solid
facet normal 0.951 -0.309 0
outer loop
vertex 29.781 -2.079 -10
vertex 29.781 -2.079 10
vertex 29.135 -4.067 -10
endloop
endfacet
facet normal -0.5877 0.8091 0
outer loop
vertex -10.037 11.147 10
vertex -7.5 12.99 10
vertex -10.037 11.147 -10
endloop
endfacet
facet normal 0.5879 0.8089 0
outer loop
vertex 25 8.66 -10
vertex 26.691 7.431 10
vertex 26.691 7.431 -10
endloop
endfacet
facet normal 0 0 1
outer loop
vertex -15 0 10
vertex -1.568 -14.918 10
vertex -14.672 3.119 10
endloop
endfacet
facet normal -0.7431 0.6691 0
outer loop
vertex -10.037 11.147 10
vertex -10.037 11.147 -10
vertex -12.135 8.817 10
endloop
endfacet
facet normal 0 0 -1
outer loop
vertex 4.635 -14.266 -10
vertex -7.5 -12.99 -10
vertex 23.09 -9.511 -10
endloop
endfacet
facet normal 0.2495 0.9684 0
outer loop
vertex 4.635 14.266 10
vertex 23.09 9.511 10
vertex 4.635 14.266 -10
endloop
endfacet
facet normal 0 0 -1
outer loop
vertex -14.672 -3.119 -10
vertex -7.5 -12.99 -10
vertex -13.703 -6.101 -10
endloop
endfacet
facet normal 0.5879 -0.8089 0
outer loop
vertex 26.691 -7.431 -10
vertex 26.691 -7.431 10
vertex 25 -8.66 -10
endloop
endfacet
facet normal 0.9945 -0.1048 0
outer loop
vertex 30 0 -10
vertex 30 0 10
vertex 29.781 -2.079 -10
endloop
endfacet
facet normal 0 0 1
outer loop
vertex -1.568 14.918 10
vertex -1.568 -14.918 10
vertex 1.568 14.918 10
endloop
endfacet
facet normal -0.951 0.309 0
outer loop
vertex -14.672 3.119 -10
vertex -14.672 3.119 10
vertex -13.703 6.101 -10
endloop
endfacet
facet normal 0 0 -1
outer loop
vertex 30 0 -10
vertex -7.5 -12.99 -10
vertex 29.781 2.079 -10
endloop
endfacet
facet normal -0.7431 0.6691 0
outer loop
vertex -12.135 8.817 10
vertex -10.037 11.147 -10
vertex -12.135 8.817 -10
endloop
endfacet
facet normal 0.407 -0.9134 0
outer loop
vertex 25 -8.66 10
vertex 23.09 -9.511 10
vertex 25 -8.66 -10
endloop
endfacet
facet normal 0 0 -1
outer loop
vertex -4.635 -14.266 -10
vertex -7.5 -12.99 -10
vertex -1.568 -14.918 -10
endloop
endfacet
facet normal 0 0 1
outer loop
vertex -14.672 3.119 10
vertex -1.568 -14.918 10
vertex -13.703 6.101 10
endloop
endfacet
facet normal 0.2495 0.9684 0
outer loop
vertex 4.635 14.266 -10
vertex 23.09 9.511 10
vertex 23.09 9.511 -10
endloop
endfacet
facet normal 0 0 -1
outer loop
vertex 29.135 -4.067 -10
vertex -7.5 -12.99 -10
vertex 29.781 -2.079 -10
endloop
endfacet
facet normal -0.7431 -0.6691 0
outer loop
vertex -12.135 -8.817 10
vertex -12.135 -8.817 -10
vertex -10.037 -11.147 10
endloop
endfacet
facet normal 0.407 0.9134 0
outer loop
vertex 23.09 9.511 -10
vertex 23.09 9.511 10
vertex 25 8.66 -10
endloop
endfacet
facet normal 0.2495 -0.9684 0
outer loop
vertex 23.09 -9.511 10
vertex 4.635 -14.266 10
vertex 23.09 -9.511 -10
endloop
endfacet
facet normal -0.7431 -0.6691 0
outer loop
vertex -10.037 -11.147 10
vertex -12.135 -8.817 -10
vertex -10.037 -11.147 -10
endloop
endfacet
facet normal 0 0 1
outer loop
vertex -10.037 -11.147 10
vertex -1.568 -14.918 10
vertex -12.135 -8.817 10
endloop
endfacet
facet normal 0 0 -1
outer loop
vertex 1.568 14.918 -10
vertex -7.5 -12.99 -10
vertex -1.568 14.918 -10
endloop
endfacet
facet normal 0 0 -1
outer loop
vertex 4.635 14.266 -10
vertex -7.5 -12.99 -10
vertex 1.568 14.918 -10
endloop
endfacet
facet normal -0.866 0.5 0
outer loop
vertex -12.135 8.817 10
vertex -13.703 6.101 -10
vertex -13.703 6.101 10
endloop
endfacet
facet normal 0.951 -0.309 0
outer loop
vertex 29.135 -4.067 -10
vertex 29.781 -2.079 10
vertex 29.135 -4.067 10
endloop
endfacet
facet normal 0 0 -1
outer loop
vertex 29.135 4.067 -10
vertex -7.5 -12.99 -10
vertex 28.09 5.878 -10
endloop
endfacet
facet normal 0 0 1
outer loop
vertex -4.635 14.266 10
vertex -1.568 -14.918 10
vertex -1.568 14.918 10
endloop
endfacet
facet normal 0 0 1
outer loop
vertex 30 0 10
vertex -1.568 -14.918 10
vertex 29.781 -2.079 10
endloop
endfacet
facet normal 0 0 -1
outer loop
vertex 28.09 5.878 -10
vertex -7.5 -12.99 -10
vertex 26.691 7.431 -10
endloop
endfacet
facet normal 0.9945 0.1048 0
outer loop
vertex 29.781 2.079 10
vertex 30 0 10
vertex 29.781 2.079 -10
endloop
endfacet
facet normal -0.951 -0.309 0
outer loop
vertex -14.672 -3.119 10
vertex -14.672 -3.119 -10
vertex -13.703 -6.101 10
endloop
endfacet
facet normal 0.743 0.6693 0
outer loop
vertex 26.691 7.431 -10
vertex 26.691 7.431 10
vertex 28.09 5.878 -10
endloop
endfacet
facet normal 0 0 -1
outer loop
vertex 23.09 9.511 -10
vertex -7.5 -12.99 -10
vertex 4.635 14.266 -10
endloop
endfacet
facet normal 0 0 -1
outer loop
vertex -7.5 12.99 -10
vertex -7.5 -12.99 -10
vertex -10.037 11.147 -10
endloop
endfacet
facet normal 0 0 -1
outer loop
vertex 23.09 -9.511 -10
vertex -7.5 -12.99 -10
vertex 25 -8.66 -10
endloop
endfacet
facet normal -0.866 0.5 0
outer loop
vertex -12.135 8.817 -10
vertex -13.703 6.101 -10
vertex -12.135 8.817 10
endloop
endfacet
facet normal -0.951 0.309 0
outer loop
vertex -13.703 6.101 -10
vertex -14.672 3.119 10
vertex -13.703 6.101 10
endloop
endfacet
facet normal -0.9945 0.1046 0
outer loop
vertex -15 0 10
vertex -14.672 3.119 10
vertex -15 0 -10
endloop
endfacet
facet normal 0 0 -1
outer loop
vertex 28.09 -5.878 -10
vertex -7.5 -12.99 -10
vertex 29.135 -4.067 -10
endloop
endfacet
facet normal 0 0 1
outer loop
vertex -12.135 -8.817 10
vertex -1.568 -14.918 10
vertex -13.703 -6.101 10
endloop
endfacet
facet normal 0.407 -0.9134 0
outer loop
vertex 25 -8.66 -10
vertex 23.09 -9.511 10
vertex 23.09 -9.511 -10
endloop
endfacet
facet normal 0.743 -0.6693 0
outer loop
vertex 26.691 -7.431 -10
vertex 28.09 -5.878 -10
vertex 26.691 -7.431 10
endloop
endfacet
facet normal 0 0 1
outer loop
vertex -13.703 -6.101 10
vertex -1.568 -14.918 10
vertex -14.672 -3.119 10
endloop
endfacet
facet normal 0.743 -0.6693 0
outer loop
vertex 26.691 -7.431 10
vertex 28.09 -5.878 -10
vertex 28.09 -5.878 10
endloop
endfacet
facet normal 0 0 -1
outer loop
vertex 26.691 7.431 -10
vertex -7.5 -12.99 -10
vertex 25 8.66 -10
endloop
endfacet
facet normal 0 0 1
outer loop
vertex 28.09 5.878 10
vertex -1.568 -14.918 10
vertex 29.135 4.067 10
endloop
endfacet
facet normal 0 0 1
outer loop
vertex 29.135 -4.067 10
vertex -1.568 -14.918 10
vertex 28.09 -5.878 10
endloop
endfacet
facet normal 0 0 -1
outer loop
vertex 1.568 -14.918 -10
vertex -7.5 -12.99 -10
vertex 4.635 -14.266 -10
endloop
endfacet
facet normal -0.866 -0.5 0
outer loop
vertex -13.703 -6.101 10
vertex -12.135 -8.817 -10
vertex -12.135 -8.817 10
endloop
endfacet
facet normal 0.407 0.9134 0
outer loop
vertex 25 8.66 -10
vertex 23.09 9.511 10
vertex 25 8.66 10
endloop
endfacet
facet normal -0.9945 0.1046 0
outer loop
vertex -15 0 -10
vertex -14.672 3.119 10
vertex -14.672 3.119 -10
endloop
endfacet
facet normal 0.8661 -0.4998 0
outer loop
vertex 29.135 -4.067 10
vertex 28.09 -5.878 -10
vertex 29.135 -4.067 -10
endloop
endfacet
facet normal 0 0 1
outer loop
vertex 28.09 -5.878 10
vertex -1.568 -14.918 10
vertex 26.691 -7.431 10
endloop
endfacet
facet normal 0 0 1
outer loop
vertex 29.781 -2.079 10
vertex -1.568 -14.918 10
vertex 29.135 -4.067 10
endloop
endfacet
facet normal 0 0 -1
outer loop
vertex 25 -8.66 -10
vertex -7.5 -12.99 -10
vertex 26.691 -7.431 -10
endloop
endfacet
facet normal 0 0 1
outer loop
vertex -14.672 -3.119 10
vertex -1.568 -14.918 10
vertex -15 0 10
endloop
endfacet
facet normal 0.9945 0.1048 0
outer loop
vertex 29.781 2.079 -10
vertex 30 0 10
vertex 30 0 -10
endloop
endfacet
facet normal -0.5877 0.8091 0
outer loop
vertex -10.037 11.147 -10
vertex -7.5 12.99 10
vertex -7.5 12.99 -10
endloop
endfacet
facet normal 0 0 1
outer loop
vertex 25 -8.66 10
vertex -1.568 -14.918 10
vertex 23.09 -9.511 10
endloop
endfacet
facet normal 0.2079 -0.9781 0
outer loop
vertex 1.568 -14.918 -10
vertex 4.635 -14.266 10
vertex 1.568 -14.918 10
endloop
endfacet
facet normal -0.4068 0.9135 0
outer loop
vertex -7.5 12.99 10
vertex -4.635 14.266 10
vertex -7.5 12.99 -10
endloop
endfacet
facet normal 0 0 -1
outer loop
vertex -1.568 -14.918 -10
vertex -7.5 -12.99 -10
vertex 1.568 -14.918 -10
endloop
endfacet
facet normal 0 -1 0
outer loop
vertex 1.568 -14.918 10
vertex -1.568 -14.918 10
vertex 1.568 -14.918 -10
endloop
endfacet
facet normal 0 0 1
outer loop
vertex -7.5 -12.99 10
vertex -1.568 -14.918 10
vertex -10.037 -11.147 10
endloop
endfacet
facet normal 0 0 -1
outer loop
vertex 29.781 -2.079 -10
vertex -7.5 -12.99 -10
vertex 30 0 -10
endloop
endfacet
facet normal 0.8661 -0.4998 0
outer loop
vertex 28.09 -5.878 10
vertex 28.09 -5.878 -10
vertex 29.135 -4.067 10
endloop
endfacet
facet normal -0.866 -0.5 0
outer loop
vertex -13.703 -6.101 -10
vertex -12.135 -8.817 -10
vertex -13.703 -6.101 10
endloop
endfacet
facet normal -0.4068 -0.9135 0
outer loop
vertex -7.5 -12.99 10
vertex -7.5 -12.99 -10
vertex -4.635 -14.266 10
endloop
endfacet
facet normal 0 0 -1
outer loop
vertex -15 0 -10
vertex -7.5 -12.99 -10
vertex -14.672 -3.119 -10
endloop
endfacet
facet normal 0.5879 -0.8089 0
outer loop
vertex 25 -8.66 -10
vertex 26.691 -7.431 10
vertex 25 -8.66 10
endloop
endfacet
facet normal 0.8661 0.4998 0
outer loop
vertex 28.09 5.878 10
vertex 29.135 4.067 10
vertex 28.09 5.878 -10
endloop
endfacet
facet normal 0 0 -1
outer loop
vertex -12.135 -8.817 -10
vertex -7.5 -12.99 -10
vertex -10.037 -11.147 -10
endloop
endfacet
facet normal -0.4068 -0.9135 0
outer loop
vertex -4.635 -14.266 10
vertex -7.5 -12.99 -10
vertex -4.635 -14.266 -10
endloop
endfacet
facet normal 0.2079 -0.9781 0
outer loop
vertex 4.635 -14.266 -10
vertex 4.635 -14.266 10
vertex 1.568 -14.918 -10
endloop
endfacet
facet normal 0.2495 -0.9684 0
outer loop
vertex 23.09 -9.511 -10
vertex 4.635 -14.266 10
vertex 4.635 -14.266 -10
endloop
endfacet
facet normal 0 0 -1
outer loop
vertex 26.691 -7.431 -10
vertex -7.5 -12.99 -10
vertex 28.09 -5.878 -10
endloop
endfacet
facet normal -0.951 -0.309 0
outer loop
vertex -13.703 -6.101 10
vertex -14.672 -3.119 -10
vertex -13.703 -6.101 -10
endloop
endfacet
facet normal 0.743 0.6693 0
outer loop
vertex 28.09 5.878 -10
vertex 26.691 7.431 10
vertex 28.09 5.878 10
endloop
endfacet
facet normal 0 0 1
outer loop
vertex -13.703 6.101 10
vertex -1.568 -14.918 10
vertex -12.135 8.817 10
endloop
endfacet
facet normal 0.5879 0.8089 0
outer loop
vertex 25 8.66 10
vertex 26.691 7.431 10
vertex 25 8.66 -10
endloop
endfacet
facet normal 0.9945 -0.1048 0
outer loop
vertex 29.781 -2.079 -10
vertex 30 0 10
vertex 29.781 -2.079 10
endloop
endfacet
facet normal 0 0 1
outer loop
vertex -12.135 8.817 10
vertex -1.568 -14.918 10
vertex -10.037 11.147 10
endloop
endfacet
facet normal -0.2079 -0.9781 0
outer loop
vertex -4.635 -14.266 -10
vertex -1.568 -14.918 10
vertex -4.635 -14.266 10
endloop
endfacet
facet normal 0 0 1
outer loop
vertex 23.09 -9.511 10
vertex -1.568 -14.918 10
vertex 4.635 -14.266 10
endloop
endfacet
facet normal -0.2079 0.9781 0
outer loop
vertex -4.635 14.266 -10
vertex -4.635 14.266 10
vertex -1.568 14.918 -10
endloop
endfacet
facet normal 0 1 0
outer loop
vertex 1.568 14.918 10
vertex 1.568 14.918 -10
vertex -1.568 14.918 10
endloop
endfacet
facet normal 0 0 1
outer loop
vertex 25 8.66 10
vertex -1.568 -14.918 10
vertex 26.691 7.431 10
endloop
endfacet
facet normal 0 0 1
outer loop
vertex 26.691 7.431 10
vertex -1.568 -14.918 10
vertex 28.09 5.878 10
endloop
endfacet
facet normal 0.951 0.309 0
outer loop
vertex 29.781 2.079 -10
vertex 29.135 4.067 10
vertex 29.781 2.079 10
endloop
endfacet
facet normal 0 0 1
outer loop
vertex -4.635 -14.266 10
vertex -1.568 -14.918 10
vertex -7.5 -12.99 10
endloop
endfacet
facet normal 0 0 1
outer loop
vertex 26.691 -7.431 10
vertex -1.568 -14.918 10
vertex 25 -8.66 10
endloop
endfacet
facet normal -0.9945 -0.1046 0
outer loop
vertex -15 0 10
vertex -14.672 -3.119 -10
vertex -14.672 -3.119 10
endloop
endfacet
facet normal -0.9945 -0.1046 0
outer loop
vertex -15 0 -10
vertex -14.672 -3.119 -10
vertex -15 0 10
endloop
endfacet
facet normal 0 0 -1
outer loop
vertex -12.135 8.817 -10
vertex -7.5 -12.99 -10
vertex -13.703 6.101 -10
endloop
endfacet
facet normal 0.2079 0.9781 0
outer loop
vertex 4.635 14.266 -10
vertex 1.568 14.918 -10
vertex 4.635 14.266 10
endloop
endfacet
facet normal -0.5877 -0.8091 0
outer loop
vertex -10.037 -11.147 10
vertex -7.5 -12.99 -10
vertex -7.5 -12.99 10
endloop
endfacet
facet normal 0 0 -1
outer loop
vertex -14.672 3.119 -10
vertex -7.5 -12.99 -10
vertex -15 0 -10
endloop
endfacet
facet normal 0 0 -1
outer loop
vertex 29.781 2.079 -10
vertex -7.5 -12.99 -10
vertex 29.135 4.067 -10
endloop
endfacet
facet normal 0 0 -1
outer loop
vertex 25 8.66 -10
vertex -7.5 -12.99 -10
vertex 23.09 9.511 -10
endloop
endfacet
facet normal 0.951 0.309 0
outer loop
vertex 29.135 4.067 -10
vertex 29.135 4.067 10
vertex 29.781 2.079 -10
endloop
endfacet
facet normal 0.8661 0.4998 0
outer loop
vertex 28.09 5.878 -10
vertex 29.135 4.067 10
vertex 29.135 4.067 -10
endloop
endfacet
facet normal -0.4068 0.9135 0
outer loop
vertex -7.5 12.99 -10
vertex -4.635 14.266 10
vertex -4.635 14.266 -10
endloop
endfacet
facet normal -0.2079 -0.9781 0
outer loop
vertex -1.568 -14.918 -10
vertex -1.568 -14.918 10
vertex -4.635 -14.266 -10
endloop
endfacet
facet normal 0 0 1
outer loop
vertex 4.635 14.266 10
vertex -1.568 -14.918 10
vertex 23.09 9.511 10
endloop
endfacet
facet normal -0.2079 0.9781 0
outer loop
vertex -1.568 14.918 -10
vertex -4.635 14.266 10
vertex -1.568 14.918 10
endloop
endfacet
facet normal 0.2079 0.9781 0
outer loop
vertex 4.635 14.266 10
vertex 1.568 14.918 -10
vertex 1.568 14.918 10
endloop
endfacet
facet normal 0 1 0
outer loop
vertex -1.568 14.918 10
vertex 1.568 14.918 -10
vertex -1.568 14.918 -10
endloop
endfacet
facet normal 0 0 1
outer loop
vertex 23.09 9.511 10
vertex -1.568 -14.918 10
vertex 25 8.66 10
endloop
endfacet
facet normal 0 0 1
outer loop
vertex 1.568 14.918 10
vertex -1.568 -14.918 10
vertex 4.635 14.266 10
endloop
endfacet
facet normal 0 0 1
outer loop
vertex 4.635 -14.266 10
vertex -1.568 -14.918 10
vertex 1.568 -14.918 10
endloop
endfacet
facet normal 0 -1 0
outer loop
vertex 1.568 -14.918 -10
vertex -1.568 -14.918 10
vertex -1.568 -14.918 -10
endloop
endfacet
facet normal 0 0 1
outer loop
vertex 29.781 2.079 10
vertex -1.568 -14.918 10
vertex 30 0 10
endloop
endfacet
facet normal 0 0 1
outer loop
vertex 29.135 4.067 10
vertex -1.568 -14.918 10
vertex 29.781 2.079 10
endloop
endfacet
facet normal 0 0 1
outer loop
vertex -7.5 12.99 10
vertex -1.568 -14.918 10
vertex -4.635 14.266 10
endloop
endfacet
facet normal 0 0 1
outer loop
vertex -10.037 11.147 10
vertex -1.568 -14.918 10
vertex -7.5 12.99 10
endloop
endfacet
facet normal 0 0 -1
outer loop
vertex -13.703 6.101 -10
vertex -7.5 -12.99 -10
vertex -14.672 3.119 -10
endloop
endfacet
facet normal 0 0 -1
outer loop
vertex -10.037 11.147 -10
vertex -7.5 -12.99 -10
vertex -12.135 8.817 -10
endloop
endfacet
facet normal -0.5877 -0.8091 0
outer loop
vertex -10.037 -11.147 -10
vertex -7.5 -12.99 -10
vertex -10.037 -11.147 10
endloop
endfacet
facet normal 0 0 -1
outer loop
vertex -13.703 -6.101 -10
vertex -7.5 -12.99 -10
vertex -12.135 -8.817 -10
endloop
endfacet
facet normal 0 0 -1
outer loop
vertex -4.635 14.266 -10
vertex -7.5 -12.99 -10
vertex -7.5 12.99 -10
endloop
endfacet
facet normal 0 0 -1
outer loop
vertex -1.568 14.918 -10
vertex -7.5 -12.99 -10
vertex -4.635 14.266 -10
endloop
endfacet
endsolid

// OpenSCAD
hull(){cylinder(  20,   15, 15,true);translate([20,0]) cylinder(  20,   10, 10,true);}
